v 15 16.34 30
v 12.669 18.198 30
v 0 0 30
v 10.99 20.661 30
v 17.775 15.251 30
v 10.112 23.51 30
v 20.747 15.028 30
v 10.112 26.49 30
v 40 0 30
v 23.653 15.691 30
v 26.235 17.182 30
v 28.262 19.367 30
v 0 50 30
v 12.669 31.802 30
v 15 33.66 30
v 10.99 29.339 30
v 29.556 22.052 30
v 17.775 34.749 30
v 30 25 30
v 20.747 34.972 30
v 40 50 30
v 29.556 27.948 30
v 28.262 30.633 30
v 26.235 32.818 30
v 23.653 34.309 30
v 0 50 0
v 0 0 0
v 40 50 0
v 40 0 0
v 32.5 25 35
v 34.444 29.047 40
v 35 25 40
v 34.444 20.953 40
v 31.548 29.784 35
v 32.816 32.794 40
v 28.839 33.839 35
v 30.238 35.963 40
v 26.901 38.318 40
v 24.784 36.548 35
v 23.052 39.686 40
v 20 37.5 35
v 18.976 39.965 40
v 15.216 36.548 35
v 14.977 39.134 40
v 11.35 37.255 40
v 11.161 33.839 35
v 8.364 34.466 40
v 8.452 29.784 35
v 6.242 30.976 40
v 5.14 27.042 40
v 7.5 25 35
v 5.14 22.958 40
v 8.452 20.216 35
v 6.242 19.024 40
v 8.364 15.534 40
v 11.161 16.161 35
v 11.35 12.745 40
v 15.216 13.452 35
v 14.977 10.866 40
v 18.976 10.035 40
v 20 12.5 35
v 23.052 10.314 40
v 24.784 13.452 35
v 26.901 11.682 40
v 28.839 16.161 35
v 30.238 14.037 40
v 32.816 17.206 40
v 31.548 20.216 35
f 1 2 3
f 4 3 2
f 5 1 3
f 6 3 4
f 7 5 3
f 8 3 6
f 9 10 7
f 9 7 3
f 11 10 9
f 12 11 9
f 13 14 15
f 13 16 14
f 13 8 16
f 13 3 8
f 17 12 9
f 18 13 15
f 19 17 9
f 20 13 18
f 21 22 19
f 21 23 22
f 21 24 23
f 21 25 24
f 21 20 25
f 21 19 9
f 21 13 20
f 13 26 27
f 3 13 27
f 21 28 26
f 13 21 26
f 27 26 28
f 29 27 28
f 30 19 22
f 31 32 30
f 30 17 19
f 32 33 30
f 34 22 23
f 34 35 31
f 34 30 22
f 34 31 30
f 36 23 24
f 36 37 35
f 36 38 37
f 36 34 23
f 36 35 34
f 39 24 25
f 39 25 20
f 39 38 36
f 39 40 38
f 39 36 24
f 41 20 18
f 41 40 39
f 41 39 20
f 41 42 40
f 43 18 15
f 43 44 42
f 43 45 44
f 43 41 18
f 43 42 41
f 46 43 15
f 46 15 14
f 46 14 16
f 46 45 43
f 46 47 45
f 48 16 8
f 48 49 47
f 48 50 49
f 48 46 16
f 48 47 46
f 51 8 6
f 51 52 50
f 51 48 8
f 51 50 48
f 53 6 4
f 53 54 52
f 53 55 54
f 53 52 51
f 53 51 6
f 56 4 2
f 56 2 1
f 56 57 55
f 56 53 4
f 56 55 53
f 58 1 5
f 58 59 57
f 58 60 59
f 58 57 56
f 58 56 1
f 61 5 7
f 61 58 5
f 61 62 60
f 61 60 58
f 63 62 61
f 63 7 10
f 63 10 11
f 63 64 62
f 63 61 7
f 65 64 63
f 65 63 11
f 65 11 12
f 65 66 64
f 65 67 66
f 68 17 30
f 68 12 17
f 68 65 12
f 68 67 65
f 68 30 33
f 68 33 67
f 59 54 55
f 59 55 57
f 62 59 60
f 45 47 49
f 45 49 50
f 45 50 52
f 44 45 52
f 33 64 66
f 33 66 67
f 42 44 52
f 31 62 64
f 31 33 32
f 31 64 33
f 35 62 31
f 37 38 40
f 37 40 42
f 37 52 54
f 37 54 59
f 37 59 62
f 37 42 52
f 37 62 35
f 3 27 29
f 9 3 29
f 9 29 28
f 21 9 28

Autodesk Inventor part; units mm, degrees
ref_plane "YZ Plane" through (0, 0, 0) normal (1, 0, 0) x (0, 1, 0)
ref_plane "XZ Plane" through (0, 0, 0) normal (0, 1, 0) x (-1, 0, 0)
sketch "Sketch1" plane through (0, 0, 0) normal (0, 0, 1) x (1, 0, 0)
  line L0 (0, 0) -> (40, 0)
  line L1 (40, 0) -> (40, 50)
  line L2 (40, 50) -> (0, 50)
  line L3 (0, 50) -> (0, 0)
  dimension "d0" = 40
  dimension "d1" = 50
extrude "Extrusion1" add sketch "Sketch1" along normal blind 30
sketch "Sketch2" plane through (0, 0, 30) normal (0, 0, 1) x (1, 0, 0)
  circle A0 centre (20, 25) radius 10
ref_plane "Work Plane1" through (0, 0, 40) normal (0, 0, 1) x (1, 0, 0)
sketch "Sketch3" plane through (0, 0, 40) normal (0, 0, 1) x (1, 0, 0)
  circle A0 centre (20, 25) radius 15
  point P0 (0, 0)
  dimension "d6" = 30
loft "Loft1" add profiles "Sketch3", "Sketch2"
properties part number "Camera"
